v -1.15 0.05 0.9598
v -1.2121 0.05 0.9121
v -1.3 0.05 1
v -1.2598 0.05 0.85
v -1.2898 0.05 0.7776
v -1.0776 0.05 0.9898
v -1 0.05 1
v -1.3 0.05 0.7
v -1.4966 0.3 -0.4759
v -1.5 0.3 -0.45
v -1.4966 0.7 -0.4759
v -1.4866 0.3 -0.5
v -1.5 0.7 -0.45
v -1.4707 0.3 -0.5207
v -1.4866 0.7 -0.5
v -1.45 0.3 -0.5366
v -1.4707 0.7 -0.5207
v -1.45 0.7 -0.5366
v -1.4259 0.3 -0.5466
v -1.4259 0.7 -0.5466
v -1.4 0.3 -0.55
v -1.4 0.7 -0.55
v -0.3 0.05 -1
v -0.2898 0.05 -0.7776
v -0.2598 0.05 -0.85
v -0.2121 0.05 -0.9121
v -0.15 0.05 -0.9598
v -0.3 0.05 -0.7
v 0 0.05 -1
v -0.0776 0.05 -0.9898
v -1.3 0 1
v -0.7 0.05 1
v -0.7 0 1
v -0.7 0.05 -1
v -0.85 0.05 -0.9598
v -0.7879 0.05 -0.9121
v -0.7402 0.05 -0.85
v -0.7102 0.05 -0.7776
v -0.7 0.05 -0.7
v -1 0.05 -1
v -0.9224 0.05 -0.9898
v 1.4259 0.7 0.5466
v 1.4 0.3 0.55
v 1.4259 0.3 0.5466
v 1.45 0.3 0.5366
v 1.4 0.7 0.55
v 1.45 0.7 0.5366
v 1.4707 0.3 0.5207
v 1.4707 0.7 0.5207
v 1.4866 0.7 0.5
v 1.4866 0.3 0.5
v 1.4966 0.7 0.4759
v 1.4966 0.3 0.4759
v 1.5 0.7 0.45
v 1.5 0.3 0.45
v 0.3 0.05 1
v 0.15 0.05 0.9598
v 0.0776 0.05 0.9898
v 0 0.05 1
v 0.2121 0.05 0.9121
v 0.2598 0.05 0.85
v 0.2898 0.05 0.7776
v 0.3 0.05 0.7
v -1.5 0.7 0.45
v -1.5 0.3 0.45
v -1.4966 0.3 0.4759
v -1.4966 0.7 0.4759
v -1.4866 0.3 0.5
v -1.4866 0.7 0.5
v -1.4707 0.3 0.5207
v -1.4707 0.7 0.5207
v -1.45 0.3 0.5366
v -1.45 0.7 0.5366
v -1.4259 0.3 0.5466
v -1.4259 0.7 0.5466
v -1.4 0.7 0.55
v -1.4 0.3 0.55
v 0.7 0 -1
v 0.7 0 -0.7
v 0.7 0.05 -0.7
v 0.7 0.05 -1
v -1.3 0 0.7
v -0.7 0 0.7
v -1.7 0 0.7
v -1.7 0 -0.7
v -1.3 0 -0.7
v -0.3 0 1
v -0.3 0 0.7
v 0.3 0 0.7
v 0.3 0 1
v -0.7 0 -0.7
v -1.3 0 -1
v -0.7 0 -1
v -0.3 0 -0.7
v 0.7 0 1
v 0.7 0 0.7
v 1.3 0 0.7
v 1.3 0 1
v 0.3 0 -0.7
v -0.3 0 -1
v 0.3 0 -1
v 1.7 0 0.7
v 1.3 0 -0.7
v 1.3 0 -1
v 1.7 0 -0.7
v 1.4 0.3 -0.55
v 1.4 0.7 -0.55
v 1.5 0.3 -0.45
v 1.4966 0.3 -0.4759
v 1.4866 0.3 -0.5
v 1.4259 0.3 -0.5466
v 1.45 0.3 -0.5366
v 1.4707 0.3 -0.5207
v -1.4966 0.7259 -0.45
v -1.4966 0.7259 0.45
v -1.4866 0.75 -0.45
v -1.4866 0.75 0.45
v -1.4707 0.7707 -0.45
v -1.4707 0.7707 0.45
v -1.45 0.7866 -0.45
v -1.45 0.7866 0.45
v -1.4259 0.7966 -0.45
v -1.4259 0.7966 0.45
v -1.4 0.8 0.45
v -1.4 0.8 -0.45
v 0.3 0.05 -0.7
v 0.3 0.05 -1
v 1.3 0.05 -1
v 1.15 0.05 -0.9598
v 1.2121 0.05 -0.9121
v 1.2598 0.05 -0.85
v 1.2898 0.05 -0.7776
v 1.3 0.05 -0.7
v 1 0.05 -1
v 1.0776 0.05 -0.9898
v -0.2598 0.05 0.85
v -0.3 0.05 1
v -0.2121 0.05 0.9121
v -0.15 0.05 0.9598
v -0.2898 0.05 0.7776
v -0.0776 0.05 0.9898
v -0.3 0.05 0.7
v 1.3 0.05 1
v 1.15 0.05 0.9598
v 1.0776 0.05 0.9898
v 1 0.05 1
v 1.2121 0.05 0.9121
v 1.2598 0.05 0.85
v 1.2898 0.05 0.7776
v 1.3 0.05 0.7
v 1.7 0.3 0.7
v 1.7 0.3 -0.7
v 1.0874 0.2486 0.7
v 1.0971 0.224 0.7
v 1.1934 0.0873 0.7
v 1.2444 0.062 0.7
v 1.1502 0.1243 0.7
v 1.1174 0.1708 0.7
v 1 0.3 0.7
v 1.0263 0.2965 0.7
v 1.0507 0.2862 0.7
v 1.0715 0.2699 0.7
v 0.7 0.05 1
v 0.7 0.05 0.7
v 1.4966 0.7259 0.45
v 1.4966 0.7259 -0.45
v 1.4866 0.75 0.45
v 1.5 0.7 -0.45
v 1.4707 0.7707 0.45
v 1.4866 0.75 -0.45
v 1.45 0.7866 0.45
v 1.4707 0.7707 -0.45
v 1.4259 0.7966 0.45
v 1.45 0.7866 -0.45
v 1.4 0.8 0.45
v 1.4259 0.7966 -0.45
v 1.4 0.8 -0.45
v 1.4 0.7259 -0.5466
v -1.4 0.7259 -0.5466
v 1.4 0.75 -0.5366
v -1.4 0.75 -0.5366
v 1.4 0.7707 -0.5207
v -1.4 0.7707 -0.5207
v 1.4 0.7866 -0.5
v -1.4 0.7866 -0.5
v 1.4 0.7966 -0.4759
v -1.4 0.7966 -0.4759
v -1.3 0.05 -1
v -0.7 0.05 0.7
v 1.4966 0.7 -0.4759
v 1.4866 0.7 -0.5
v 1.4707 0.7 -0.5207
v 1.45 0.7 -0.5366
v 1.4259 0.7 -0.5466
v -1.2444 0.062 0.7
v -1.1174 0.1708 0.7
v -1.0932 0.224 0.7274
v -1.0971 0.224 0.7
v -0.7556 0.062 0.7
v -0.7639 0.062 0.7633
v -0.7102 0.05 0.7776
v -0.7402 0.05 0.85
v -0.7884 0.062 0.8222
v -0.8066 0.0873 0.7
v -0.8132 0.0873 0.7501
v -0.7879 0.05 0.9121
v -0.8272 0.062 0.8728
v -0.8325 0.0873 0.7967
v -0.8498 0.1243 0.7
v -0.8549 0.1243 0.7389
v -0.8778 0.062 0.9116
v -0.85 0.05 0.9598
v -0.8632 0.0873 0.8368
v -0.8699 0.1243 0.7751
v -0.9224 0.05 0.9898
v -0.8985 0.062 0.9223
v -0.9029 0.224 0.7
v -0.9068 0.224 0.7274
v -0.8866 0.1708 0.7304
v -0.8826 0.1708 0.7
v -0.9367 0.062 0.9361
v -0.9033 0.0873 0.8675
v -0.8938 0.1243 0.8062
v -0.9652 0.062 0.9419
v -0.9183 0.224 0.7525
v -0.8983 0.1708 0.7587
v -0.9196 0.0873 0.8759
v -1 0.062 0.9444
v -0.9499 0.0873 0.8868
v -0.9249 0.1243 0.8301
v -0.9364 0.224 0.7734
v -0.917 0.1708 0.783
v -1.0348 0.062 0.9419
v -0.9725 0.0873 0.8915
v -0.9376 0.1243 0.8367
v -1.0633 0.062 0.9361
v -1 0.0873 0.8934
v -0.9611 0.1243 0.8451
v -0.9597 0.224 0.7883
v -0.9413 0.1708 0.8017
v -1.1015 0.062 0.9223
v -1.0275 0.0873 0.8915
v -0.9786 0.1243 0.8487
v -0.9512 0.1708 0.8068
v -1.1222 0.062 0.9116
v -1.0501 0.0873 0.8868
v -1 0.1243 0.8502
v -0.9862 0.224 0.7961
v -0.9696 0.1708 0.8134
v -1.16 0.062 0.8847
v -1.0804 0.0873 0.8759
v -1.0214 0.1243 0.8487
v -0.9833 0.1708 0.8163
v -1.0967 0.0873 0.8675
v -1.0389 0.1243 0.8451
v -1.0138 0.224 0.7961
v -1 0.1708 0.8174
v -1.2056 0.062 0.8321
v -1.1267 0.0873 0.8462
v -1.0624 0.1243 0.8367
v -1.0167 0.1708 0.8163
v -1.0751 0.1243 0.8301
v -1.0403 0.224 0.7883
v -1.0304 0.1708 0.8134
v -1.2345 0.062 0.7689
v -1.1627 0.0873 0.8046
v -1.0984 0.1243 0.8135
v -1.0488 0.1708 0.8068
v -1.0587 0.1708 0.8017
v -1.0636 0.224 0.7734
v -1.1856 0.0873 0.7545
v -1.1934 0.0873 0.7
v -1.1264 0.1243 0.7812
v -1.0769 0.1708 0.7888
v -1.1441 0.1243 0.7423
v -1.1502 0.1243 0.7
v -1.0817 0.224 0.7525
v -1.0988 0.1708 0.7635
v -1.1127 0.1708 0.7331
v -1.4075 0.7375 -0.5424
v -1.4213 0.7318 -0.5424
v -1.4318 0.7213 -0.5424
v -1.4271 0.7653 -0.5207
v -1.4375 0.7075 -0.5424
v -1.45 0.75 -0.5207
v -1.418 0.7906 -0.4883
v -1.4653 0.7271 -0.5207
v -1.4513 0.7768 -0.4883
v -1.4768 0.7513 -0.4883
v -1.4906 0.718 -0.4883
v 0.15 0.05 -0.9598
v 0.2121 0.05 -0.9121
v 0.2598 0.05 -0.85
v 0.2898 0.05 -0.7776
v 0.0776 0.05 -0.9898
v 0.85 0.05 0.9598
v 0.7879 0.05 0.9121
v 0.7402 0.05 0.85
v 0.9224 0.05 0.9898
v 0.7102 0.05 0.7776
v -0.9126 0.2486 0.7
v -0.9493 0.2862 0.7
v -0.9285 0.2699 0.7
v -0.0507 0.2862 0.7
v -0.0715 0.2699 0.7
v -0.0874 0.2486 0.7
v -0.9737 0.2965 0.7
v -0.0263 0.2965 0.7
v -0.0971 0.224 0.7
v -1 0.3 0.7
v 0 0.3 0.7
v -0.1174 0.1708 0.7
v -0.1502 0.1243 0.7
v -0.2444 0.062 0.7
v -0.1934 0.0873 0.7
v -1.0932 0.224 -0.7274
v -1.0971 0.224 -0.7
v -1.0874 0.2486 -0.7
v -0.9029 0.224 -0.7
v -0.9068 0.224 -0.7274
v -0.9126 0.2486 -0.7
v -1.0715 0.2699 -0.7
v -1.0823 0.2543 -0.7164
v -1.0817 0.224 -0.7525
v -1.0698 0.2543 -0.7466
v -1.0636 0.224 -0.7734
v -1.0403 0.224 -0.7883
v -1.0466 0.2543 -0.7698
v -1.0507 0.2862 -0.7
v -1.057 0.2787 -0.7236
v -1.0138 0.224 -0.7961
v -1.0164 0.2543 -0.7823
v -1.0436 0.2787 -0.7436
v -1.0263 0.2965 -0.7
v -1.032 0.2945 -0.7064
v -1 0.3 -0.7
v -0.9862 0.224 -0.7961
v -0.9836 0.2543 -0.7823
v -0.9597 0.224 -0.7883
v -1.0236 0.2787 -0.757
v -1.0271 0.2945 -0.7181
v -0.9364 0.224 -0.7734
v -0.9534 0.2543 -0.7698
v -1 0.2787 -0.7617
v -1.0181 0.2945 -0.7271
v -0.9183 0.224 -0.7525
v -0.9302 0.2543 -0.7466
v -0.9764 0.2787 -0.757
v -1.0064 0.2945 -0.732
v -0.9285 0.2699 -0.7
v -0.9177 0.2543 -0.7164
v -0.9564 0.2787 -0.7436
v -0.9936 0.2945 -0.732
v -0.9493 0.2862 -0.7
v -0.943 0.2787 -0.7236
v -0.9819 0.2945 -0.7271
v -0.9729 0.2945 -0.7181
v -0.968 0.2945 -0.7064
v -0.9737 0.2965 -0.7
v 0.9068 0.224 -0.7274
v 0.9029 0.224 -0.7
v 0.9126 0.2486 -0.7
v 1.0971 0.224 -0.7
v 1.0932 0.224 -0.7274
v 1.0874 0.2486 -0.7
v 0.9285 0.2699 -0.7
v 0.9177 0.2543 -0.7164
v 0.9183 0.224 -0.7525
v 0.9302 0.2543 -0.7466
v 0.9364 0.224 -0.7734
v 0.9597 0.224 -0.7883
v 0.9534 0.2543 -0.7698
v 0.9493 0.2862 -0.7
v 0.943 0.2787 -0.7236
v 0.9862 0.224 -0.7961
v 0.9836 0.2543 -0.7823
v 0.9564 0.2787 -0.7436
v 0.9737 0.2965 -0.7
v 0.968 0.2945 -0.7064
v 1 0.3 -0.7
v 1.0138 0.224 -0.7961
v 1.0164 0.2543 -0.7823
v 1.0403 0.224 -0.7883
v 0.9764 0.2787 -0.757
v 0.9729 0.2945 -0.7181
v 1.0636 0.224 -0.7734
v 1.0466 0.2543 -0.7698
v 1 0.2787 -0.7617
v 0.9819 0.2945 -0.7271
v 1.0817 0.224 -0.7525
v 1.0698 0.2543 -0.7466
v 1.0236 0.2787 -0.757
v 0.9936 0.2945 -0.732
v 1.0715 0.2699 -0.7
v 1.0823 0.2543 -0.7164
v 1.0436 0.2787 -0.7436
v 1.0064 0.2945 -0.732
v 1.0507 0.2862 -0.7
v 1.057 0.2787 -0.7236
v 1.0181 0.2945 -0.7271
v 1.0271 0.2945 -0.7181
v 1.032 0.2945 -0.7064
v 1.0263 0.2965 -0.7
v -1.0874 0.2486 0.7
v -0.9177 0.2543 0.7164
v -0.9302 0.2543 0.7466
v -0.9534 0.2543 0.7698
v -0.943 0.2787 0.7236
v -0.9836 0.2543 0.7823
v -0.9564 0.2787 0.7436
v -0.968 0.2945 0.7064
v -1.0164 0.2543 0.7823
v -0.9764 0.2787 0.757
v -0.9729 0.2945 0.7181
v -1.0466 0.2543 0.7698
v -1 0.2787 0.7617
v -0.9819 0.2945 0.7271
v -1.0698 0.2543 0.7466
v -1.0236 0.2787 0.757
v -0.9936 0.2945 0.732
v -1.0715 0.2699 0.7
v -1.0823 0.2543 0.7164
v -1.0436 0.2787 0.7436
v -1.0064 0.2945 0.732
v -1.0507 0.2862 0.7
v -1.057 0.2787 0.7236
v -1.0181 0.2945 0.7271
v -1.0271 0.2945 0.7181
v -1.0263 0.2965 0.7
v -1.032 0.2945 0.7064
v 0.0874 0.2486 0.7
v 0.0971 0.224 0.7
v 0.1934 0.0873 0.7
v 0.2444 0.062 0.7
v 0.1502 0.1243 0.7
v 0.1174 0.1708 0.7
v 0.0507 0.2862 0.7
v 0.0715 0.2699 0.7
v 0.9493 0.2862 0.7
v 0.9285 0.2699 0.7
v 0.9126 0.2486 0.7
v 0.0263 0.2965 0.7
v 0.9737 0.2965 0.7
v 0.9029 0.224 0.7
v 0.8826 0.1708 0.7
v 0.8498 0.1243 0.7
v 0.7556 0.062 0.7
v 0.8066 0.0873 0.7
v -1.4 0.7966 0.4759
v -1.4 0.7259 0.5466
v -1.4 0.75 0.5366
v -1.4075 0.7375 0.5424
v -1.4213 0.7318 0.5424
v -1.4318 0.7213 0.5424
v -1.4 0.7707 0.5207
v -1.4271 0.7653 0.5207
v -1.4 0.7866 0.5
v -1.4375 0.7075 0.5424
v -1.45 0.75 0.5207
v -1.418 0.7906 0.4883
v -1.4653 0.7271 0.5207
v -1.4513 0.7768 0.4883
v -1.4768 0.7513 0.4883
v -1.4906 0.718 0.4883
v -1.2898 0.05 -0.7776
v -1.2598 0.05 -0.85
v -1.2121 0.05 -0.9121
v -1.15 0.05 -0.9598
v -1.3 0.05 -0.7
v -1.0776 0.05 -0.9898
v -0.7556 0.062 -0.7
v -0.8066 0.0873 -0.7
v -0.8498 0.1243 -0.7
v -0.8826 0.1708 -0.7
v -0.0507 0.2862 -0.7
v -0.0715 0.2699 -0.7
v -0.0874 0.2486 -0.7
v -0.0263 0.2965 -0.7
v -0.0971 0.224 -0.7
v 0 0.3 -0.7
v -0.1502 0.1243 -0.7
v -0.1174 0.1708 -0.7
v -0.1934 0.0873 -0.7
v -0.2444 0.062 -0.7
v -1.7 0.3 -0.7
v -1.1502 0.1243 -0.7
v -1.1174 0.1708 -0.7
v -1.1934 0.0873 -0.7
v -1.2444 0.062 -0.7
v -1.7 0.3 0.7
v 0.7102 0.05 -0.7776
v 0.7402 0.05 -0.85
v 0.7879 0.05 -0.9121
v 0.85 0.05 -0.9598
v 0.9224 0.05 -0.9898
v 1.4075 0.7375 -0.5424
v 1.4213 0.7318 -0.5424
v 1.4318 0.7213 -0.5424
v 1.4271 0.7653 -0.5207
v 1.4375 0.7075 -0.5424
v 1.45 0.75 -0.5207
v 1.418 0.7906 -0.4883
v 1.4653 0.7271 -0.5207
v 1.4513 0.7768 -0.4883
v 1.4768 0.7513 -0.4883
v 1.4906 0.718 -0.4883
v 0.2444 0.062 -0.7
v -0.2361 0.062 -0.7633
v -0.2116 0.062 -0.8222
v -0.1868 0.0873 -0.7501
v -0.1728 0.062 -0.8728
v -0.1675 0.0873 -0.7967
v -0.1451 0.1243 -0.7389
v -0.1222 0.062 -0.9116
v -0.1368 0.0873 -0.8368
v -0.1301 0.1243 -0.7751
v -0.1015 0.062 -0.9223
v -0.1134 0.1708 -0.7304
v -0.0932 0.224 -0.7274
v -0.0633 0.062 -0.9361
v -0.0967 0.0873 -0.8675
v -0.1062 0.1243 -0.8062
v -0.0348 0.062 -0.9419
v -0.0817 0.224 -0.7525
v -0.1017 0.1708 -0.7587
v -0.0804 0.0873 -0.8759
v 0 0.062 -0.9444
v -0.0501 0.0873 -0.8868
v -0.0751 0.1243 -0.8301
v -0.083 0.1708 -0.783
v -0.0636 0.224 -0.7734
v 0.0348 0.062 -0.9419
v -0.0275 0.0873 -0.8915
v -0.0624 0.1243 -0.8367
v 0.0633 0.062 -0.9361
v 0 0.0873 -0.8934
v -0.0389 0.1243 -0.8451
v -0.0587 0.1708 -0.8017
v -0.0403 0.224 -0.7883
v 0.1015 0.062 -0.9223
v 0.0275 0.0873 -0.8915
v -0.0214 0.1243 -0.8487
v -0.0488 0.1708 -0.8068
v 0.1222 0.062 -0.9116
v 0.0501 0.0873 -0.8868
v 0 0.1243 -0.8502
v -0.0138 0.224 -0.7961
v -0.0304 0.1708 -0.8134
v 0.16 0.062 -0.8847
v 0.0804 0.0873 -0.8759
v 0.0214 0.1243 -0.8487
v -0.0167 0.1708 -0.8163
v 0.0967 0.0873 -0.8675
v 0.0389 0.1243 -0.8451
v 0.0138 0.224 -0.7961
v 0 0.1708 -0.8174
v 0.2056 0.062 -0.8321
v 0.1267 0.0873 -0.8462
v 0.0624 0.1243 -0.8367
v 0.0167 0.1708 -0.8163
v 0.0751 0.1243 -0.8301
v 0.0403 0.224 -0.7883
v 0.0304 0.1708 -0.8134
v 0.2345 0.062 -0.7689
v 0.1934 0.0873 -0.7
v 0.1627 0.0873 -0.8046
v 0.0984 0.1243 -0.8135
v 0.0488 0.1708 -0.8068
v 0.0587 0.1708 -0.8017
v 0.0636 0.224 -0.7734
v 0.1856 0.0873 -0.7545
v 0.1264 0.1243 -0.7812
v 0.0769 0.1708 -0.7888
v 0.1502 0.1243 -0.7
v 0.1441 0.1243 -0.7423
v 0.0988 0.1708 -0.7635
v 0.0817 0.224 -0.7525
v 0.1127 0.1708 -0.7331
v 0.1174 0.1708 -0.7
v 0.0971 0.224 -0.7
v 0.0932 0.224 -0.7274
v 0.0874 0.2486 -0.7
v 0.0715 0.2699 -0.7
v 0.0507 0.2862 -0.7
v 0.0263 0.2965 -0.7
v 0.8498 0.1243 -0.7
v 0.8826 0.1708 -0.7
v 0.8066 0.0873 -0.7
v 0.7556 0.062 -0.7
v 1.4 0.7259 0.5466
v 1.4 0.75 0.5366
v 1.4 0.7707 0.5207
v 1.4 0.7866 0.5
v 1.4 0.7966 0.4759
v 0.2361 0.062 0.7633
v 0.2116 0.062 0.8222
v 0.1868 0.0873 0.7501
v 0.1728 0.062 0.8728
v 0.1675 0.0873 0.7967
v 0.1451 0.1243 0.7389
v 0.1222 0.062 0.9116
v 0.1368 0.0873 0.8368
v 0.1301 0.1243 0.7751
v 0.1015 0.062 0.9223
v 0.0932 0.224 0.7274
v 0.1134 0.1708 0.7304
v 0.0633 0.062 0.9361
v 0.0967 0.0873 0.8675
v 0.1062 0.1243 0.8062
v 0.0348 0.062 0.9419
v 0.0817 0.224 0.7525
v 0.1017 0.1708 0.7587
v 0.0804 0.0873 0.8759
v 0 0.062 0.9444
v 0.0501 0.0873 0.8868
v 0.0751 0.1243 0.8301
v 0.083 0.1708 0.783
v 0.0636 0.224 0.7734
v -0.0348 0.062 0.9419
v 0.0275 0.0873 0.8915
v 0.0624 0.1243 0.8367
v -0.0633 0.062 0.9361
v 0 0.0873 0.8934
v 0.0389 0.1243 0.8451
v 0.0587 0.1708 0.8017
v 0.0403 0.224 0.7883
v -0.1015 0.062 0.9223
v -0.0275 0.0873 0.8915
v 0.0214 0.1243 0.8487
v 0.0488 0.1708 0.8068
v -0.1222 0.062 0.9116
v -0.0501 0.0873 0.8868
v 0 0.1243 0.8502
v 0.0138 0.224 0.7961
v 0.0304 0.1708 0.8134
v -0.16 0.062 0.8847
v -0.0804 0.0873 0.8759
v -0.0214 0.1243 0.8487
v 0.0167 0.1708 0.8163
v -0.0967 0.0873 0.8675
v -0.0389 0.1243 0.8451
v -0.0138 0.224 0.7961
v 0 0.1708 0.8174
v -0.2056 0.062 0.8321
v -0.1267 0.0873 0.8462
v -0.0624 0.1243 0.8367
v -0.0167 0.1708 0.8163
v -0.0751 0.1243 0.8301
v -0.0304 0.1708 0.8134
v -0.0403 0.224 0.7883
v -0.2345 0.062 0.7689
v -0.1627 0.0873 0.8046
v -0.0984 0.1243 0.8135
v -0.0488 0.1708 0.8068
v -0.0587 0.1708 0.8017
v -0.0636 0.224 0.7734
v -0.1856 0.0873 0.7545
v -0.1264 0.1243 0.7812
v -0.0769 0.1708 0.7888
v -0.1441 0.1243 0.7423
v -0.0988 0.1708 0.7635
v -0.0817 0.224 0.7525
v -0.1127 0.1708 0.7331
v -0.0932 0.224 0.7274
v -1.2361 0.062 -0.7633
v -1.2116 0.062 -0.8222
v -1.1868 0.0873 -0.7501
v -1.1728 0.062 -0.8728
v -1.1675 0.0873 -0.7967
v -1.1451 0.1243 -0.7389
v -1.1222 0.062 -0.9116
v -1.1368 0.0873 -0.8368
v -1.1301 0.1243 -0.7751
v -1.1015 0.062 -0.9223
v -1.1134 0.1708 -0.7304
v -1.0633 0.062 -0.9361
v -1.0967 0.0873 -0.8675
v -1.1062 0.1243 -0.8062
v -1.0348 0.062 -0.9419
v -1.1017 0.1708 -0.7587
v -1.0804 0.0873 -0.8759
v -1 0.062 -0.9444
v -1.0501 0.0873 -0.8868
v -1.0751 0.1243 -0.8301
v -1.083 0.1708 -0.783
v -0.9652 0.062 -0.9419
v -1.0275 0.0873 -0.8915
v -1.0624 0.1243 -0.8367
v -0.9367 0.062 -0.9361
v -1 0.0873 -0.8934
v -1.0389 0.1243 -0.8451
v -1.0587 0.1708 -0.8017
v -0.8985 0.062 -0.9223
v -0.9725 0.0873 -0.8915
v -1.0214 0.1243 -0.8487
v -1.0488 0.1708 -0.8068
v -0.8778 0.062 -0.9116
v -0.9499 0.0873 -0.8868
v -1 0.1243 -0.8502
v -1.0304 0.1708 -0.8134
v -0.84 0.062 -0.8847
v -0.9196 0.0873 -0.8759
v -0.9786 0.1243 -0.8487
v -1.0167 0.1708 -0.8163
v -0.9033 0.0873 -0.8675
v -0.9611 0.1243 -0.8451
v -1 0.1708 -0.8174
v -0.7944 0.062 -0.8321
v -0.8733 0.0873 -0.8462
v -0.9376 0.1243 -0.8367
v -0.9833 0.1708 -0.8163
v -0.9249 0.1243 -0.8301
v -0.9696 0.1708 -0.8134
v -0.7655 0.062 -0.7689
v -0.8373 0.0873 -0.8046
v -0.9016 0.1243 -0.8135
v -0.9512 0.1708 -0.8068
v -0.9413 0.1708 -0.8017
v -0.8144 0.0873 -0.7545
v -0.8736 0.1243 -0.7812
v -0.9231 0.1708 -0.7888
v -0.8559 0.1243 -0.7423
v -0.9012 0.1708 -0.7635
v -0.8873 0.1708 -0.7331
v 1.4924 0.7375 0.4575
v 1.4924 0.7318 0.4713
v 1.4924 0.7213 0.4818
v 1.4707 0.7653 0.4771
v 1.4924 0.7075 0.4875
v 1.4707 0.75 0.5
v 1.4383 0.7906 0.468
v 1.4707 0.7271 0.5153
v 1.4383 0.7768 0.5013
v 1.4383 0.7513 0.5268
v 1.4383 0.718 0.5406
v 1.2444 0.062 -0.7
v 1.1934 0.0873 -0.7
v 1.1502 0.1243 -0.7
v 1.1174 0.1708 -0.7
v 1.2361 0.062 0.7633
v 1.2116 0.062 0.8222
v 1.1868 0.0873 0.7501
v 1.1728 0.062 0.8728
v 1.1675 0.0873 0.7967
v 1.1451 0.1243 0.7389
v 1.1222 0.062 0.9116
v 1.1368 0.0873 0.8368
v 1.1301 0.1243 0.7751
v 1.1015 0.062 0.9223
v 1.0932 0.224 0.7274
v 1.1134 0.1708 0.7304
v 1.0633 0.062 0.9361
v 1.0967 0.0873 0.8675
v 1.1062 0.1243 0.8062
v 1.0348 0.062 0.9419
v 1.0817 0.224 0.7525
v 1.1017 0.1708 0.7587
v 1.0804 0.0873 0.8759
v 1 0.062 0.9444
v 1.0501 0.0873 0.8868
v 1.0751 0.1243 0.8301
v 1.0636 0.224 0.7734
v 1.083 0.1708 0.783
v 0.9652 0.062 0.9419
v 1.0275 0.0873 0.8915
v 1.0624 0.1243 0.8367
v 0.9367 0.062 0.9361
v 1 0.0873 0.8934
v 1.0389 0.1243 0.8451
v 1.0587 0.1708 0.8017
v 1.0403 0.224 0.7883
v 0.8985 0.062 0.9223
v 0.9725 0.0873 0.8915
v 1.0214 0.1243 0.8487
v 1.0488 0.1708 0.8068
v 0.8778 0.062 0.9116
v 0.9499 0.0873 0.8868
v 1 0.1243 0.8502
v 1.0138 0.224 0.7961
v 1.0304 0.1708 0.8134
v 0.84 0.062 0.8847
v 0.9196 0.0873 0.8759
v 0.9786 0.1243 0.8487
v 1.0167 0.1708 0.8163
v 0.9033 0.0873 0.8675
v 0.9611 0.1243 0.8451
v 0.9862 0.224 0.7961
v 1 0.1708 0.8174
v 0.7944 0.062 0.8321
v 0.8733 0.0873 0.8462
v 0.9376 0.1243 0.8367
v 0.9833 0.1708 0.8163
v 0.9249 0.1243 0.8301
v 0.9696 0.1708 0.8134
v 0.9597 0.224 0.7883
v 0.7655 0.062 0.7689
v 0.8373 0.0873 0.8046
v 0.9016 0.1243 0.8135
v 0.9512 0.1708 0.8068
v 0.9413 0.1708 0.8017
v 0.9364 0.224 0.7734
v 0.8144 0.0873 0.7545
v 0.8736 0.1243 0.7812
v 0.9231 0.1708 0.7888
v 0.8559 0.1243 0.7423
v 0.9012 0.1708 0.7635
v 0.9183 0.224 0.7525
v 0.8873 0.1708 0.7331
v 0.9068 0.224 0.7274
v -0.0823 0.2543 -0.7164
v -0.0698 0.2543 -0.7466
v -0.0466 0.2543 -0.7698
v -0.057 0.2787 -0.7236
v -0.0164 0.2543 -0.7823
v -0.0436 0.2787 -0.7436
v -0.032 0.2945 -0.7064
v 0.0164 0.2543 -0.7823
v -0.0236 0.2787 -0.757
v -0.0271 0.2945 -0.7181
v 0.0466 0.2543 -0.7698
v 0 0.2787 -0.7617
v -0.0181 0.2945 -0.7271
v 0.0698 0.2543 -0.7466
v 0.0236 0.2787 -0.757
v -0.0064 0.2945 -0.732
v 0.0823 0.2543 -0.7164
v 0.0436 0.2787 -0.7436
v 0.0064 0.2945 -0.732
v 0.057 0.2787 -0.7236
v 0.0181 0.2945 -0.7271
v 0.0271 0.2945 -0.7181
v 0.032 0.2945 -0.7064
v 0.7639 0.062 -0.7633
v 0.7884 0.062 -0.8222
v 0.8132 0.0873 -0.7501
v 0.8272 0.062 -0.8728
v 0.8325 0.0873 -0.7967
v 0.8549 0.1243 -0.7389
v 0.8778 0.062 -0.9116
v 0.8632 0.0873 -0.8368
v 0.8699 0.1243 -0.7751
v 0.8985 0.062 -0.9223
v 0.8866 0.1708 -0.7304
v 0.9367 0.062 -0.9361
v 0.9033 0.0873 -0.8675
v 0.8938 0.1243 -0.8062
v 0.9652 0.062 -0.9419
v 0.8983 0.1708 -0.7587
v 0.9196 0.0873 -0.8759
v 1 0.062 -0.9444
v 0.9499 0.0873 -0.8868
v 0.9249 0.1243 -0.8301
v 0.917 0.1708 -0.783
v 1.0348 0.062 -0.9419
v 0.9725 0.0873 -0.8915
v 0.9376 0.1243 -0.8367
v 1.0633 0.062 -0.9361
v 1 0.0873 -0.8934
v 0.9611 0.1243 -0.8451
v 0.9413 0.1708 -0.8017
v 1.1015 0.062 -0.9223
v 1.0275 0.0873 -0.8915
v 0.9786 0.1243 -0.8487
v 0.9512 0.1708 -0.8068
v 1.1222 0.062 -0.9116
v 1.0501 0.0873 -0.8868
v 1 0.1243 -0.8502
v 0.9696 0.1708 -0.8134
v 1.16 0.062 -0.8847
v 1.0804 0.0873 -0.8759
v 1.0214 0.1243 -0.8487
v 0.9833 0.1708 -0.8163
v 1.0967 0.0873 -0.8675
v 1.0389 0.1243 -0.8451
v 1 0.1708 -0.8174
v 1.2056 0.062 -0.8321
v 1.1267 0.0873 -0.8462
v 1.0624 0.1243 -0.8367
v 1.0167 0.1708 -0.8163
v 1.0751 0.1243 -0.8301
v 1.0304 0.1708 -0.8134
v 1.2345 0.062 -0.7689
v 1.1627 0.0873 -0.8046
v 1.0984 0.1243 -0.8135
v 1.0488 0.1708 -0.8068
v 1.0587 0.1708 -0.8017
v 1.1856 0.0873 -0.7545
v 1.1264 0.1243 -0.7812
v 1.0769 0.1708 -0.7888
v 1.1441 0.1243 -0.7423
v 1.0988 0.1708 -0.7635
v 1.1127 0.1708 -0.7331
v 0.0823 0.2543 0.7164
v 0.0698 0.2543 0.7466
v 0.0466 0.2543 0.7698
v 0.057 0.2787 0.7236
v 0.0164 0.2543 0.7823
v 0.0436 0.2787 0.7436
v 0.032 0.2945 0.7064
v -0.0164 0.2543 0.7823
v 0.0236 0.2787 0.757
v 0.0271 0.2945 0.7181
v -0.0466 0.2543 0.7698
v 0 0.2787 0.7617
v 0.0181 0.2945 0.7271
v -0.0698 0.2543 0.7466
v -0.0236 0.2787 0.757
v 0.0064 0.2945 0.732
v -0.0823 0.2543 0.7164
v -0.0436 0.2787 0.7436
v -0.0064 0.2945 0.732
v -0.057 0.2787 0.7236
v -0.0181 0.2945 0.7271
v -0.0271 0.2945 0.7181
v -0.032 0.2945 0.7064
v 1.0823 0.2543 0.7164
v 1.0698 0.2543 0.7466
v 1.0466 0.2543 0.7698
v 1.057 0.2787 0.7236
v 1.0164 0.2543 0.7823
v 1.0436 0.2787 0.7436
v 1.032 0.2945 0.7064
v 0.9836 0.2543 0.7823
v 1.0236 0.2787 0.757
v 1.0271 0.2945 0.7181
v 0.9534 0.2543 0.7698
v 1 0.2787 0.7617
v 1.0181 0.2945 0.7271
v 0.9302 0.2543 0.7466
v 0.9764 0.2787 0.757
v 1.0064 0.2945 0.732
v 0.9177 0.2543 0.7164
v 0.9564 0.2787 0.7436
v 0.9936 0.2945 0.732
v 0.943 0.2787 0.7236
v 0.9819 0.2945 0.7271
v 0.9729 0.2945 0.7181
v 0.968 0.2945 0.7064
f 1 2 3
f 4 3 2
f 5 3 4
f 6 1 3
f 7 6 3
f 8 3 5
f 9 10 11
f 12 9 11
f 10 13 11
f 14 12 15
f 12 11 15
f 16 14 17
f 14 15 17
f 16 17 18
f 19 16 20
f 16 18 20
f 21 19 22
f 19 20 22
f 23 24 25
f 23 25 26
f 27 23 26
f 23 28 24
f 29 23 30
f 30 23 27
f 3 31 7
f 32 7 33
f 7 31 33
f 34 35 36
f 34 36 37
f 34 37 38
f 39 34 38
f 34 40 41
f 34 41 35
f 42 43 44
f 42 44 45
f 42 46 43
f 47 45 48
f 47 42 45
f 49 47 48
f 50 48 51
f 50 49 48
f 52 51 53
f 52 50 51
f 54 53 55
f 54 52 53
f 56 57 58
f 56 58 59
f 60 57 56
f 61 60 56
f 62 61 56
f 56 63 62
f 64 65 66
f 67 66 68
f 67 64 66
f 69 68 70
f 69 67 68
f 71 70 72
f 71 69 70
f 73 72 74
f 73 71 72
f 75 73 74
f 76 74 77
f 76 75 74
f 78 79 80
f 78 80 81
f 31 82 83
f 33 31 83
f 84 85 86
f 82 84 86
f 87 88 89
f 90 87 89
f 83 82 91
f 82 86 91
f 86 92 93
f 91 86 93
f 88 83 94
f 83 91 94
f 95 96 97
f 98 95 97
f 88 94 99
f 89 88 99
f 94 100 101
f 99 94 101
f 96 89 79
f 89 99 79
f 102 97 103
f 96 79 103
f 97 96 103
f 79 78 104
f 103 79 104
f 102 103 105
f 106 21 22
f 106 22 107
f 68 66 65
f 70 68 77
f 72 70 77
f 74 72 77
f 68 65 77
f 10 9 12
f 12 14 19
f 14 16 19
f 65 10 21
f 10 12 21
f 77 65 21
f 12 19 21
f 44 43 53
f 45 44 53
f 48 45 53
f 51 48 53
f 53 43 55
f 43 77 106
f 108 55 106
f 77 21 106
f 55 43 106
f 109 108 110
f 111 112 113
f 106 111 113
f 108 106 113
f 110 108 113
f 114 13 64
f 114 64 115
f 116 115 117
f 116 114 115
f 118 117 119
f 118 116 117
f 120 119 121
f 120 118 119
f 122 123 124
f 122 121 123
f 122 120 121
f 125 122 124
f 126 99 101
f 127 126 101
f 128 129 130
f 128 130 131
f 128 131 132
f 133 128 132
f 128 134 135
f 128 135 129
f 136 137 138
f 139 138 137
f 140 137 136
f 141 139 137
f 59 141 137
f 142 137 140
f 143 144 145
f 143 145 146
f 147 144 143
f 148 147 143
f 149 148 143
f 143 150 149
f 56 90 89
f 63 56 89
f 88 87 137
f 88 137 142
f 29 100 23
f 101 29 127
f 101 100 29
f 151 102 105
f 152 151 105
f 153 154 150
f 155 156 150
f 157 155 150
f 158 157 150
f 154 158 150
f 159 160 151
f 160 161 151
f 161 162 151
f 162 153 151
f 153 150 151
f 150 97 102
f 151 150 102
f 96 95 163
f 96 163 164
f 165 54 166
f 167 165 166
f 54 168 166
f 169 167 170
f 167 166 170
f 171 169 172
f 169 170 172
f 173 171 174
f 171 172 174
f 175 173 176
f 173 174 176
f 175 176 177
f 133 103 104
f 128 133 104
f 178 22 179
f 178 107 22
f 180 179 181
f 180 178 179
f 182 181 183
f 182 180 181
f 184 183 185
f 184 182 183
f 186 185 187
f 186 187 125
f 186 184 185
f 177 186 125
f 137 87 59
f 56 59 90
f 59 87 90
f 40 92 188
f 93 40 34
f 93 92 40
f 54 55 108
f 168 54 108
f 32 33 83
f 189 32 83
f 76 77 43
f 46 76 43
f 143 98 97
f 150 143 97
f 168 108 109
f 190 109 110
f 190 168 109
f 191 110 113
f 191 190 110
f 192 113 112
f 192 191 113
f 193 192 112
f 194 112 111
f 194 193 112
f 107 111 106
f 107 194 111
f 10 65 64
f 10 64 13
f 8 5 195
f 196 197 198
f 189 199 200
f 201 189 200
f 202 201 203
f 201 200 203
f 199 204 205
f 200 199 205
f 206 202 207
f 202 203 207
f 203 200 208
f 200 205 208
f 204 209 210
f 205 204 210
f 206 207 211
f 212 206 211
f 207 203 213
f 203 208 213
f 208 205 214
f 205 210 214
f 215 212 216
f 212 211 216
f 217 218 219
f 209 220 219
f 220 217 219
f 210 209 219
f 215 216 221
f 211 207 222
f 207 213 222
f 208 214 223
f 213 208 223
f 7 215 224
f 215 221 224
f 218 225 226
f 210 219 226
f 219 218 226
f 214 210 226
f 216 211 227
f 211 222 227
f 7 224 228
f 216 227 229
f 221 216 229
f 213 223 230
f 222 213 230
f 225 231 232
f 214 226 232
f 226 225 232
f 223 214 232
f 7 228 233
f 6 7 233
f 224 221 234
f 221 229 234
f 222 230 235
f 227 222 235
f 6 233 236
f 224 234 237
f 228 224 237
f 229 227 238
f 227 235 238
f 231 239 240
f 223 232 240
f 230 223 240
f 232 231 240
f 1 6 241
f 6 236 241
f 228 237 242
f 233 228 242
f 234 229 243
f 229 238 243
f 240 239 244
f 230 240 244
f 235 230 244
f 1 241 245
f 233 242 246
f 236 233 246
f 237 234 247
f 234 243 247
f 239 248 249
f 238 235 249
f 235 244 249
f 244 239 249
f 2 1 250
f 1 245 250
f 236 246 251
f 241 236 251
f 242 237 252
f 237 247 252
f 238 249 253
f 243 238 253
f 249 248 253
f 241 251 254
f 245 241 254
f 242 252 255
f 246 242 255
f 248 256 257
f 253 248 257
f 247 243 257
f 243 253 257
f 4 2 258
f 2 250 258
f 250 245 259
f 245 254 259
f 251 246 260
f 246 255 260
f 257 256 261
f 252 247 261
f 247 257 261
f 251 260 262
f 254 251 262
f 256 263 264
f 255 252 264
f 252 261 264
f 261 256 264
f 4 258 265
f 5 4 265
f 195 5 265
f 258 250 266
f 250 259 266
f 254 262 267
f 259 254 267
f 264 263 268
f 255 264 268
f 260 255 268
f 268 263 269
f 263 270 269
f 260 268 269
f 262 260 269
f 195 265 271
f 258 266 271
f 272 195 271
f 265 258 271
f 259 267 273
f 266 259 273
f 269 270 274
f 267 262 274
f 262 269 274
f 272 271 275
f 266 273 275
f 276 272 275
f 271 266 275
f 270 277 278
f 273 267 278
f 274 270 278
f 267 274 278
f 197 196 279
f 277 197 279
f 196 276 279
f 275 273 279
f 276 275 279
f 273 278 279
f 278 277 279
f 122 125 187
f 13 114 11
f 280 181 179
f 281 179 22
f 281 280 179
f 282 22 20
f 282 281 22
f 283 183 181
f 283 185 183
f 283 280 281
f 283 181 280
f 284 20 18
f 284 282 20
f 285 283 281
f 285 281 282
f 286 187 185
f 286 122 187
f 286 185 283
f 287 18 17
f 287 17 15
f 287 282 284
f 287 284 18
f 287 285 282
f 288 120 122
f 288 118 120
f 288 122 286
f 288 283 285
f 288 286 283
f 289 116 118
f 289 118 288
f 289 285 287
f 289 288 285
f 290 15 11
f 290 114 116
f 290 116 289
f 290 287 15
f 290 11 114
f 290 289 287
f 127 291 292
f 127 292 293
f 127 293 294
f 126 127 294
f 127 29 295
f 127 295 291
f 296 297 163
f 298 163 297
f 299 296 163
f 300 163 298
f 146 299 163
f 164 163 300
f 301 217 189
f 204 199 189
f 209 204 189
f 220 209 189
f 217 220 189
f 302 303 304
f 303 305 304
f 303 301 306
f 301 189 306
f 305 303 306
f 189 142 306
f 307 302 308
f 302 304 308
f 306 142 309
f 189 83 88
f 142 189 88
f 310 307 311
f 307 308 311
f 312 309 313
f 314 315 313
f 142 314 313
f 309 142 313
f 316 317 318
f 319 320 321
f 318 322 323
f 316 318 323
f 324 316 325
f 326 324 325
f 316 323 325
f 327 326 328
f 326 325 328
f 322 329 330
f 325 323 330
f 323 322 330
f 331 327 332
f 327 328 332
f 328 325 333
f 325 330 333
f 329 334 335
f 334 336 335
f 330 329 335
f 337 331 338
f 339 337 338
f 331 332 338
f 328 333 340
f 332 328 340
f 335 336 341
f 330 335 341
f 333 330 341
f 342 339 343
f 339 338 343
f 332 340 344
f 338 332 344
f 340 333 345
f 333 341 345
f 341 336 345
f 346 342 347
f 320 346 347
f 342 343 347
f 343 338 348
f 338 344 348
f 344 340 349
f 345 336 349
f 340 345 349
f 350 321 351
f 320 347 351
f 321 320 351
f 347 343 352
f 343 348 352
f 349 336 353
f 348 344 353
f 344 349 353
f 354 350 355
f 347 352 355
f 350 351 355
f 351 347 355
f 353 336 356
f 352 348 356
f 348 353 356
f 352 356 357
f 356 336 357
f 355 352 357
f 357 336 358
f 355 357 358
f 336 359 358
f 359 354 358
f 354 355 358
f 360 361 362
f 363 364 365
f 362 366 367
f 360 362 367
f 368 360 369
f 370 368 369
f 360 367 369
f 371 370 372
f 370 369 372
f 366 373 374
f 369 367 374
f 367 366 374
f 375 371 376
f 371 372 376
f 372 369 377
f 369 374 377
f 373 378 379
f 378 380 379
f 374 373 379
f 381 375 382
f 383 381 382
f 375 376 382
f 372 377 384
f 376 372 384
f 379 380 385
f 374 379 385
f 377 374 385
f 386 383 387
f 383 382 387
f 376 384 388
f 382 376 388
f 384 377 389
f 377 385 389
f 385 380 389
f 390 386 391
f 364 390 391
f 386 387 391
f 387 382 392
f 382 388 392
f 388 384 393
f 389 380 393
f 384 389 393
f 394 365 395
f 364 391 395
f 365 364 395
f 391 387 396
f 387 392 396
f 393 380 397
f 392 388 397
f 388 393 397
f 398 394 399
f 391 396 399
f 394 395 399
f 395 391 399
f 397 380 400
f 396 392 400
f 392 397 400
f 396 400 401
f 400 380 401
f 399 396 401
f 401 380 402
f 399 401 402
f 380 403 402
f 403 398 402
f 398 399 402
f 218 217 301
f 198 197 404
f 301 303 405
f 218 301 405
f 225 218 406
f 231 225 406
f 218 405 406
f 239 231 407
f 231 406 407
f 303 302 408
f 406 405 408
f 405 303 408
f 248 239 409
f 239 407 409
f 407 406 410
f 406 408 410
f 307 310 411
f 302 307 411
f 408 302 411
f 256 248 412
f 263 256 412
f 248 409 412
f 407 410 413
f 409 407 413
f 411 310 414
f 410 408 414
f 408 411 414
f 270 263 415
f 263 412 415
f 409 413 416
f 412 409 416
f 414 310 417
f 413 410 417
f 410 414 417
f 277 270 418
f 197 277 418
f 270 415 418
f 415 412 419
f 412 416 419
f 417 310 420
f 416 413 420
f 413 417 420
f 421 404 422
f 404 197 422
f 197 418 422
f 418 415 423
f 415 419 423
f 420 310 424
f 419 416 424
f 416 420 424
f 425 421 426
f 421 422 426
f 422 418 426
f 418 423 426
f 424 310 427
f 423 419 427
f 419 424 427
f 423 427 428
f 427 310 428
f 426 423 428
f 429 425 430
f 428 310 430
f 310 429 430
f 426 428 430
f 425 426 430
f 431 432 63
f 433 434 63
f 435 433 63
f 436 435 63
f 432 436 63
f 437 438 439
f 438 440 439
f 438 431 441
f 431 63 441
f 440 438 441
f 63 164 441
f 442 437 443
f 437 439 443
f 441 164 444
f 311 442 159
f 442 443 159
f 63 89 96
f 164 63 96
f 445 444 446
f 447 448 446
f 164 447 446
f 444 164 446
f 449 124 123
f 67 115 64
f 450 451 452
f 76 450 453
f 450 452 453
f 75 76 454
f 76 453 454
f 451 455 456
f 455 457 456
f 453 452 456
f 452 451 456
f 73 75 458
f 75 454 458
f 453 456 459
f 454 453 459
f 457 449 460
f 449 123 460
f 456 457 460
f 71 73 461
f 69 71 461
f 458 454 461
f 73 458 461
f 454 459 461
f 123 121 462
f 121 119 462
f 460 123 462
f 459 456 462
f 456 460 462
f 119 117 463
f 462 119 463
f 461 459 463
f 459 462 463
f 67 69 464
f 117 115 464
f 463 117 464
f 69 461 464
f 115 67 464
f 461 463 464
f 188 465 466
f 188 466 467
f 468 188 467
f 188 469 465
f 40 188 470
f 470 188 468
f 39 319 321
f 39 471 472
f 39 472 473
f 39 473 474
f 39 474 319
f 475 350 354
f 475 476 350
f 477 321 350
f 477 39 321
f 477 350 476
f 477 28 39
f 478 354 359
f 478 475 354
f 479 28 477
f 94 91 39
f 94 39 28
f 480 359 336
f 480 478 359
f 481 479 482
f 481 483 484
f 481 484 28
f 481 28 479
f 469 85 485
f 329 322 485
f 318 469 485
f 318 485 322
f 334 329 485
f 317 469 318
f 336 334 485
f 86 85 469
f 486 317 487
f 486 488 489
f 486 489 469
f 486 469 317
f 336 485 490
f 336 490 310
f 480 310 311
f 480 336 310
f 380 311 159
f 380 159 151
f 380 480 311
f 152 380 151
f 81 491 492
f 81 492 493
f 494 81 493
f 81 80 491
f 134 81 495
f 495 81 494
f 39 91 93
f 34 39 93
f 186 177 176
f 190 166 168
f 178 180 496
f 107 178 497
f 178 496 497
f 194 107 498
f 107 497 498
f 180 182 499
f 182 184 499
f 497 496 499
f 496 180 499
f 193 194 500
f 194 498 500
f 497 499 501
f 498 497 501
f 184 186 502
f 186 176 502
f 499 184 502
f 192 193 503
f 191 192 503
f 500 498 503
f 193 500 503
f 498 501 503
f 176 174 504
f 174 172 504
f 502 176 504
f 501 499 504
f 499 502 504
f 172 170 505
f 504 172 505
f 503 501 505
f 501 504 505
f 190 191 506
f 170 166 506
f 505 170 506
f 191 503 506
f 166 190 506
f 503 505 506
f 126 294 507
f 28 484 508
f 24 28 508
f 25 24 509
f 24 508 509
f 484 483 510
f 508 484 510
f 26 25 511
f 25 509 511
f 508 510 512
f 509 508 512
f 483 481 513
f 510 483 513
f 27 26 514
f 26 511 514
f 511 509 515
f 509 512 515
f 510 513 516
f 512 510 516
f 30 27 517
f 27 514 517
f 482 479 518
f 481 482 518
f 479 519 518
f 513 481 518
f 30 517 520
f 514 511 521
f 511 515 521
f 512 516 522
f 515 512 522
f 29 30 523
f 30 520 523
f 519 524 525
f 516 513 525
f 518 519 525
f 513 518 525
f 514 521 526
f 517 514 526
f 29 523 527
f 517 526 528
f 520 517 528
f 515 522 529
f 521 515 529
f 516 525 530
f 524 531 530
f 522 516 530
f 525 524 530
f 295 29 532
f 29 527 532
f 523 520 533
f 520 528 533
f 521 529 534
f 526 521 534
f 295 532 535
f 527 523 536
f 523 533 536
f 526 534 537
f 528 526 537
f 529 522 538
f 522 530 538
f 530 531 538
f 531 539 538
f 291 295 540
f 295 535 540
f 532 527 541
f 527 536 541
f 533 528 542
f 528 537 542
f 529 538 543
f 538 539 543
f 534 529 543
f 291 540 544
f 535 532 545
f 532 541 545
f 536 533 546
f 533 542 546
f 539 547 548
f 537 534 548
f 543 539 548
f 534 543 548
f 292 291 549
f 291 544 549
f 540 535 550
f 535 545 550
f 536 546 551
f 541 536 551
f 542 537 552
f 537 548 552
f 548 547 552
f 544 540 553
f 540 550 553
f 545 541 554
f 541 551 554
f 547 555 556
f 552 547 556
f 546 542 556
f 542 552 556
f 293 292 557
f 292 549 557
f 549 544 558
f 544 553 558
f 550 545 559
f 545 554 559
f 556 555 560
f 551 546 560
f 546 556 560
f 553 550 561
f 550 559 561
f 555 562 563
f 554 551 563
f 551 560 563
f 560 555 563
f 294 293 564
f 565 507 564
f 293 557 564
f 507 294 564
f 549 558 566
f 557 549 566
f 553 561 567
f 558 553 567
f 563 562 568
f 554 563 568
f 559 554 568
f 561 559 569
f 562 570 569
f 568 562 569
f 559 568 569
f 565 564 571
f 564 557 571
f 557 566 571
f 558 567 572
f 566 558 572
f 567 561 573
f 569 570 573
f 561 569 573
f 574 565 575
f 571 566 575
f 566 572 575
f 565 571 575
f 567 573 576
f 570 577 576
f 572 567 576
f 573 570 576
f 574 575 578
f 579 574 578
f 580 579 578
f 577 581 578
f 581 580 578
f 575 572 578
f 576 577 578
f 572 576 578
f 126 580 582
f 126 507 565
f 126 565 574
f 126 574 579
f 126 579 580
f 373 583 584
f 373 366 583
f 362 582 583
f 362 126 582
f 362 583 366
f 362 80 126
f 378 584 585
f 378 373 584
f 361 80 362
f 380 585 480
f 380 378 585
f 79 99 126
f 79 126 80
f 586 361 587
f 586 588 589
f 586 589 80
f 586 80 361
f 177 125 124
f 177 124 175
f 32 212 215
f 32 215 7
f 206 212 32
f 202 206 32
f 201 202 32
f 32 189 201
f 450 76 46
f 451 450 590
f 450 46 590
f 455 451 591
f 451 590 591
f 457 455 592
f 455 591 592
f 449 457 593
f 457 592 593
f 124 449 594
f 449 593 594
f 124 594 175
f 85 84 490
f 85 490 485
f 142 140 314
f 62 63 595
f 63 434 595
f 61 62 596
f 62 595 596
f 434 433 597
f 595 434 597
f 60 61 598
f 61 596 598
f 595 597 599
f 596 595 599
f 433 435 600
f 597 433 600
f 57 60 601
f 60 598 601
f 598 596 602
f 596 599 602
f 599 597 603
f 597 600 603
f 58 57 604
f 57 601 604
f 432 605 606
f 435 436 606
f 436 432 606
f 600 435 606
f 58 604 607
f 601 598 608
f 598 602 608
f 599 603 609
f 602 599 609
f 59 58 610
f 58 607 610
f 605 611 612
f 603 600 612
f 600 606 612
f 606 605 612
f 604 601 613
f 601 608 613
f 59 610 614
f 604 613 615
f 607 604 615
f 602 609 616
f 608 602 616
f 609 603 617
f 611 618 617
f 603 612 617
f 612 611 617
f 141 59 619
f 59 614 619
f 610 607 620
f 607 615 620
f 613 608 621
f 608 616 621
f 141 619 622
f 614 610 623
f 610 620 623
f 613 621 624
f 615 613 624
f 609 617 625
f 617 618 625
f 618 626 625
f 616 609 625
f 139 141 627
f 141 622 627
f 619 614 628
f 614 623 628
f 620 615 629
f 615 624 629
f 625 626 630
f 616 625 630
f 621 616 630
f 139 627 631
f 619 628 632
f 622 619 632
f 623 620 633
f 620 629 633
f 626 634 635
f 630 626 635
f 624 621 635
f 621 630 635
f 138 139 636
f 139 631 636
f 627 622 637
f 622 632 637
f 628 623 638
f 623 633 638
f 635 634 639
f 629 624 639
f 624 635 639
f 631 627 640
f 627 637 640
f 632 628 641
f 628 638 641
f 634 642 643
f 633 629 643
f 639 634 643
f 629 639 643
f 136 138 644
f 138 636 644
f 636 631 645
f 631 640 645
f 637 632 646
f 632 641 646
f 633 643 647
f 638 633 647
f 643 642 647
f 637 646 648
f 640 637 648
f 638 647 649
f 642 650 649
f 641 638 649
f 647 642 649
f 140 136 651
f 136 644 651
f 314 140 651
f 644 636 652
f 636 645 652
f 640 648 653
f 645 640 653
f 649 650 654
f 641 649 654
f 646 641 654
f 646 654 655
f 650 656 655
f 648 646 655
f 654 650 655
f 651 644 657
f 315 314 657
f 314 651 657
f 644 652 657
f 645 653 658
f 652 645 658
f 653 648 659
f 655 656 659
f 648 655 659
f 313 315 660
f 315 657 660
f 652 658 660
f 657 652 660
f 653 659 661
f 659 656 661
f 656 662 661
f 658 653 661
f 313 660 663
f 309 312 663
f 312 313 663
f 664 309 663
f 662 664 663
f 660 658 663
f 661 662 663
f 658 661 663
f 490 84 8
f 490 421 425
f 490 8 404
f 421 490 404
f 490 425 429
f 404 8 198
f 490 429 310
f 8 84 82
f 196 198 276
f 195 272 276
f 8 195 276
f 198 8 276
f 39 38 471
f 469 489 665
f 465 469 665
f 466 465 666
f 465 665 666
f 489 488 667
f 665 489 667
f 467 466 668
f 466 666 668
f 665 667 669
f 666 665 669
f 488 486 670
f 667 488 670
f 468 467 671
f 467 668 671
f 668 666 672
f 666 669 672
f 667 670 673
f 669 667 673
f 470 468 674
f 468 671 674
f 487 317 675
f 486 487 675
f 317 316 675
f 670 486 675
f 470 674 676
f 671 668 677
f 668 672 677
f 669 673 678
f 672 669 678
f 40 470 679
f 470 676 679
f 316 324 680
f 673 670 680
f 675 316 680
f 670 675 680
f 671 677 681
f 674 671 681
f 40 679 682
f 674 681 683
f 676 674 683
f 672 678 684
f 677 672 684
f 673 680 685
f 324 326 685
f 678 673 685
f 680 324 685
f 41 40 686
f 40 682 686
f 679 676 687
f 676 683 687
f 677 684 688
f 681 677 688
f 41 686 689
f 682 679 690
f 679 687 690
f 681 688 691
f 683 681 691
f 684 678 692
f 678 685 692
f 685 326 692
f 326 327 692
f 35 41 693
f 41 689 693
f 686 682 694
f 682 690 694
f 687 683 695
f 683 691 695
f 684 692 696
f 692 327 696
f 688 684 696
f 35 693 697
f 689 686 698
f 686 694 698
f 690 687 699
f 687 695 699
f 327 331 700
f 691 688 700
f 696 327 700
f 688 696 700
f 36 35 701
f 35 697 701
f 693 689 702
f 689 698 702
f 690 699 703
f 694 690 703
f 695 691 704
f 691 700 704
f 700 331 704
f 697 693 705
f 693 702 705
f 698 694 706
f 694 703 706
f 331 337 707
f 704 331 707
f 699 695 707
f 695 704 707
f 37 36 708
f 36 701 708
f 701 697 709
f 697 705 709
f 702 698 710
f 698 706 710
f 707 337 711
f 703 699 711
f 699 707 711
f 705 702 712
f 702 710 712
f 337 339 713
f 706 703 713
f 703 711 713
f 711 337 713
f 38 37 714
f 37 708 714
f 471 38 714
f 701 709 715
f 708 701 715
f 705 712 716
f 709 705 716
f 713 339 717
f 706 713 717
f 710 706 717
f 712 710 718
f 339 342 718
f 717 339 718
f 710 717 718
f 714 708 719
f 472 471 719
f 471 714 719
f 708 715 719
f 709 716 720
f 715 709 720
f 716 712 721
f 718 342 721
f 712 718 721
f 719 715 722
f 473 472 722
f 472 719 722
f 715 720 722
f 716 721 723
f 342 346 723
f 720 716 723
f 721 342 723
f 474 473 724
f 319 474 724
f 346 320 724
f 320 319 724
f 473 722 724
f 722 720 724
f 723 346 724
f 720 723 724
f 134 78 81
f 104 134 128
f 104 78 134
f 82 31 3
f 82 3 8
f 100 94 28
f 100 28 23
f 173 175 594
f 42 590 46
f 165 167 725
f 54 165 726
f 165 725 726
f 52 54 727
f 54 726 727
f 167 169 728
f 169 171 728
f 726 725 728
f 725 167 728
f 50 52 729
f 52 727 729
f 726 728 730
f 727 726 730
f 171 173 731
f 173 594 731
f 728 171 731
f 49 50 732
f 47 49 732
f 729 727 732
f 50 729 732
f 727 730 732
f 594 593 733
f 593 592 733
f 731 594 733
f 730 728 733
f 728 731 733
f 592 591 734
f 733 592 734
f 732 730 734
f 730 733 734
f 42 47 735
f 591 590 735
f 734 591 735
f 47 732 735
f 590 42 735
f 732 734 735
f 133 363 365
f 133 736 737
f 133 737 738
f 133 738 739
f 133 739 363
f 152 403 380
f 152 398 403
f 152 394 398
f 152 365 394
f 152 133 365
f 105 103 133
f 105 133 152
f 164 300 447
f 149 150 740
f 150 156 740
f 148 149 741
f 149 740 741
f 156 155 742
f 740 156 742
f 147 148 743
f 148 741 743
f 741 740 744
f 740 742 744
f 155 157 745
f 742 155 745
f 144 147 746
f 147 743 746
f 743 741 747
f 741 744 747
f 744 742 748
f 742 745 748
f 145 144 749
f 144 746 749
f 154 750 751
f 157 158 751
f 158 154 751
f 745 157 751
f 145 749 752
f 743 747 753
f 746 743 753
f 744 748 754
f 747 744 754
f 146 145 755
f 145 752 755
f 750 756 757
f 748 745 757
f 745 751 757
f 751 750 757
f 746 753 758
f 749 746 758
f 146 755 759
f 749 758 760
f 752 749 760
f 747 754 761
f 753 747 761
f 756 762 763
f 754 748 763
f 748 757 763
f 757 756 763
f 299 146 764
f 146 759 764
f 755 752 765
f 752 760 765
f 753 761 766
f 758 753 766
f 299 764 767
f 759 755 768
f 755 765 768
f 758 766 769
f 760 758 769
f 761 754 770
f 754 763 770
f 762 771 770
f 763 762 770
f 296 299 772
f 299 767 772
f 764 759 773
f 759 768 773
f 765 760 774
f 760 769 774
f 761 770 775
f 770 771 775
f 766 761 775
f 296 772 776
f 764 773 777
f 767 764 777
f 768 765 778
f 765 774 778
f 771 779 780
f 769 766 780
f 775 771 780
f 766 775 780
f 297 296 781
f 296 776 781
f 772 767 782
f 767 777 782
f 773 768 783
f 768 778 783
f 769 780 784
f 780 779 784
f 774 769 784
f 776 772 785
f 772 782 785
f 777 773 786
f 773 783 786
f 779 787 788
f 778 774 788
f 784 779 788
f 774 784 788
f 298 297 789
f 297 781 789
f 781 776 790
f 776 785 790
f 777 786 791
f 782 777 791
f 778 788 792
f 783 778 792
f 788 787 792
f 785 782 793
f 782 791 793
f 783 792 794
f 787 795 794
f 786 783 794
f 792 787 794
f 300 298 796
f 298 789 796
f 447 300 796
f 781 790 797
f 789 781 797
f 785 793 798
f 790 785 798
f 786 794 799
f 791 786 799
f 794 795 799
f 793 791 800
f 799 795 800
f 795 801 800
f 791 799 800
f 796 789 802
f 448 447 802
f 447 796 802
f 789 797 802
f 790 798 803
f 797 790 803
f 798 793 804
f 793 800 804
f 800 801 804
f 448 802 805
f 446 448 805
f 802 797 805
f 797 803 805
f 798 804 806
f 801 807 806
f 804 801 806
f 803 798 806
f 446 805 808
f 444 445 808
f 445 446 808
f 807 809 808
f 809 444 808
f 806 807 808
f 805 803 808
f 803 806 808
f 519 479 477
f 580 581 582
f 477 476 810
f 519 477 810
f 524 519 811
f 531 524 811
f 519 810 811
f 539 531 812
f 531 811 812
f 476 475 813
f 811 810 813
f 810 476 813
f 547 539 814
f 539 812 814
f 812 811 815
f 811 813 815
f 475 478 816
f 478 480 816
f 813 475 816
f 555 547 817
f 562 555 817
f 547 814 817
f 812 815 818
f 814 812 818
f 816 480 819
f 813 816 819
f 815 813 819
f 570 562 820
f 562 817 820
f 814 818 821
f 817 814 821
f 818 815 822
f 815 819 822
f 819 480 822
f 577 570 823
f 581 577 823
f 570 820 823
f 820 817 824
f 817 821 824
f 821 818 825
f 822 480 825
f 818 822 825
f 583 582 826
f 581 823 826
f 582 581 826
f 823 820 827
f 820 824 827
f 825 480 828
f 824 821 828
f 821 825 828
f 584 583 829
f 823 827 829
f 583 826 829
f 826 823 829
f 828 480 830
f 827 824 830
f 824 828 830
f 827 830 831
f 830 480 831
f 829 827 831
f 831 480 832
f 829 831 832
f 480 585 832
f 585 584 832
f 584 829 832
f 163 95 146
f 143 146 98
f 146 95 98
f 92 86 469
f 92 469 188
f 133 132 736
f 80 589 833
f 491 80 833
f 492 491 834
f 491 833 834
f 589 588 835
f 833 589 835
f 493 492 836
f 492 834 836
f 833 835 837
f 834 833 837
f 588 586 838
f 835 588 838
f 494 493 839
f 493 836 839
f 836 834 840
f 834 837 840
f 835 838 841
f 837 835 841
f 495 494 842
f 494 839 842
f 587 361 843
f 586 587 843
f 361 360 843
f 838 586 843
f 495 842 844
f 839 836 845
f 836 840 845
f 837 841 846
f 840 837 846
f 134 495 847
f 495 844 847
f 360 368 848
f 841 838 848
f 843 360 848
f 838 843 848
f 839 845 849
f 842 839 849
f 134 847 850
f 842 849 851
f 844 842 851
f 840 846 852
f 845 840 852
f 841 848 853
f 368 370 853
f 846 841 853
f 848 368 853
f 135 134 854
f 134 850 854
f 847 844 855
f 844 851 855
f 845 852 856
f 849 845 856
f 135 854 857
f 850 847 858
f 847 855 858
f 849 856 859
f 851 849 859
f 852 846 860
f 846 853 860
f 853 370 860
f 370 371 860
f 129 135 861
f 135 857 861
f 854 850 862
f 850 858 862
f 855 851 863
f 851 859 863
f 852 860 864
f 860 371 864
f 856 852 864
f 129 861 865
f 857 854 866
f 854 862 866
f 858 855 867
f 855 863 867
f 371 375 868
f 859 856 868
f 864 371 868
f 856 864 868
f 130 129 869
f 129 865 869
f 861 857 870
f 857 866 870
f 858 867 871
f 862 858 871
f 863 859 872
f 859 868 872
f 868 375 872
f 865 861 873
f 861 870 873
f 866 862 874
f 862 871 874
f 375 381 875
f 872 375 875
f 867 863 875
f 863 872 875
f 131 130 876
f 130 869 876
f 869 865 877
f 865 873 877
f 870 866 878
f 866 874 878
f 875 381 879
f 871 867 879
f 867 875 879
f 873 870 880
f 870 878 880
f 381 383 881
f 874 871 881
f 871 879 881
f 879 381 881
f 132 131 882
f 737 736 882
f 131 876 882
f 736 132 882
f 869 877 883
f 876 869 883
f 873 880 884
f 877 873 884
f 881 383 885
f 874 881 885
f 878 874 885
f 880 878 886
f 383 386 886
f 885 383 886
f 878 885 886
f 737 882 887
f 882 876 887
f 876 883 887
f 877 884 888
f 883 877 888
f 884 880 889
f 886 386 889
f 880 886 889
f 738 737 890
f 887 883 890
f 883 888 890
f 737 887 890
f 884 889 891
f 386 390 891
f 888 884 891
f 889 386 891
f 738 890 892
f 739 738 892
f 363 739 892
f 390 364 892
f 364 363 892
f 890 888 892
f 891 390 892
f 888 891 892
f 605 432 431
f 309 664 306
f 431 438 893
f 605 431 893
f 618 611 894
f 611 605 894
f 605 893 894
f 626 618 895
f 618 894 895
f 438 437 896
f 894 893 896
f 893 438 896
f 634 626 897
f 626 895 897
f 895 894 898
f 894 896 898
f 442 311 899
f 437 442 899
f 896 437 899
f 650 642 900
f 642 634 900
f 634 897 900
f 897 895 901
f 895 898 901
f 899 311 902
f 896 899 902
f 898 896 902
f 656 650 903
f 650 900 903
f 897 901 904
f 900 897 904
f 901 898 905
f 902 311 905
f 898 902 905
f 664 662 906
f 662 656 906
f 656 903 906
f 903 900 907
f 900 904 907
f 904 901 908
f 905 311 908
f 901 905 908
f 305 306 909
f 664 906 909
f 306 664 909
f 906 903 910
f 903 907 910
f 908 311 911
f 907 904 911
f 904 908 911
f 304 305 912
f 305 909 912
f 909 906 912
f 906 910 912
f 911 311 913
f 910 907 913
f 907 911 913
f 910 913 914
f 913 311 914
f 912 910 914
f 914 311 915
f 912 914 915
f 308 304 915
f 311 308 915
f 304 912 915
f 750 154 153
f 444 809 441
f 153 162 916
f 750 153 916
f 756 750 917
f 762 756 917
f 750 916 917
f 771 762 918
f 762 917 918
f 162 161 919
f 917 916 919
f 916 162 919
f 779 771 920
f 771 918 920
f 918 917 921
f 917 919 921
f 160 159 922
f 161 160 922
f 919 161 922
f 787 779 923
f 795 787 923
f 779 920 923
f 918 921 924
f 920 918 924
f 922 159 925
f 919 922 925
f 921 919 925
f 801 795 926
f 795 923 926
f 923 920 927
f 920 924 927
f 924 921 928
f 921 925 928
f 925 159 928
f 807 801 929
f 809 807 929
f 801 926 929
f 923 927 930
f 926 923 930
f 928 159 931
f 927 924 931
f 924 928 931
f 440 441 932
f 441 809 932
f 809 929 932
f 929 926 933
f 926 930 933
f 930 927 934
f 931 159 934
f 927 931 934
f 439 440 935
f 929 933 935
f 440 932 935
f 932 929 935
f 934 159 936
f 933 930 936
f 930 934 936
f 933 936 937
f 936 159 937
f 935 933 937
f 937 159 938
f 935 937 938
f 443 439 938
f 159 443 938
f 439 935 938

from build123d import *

# Parameters (mm, degrees)
SKETCH1_W            = 3.4
SKETCH1_H            = 1.4
BOSS_EXTRUDE1_DEPTH  = 0.3
SKETCH2_W            = 3
SKETCH2_H            = 1.1
BOSS_EXTRUDE2_DEPTH  = 0.5
FILLET1_R            = 0.1
SKETCH3_W            = 0.6
SKETCH3_H            = 2
BOSS_EXTRUDE3_DEPTH  = 0.05
LPATTERN2_COUNT      = 3
LPATTERN2_PITCH      = 1
LPATTERN2_COUNT_DIR2 = 2
LPATTERN2_PITCH_DIR2 = 1.4


with BuildPart() as part:
    # Sketch1 → Boss-Extrude1 (new body)
    with BuildSketch(Plane(origin=(0, 0, 0), x_dir=(1, 0, 0), z_dir=(0, 1, 0))):
        Rectangle(SKETCH1_W, SKETCH1_H)
    extrude(amount=BOSS_EXTRUDE1_DEPTH)

    # Sketch3 → Boss-Extrude3 (add)
    with BuildSketch(Plane(origin=(0, 0, 0), x_dir=(1, 0, 0), z_dir=(0, 1, 0))):
        Rectangle(SKETCH3_W, SKETCH3_H)
        with Locations((1, 0)):
            Rectangle(SKETCH3_W, SKETCH3_H)
        with Locations((-1, 0)):
            Rectangle(SKETCH3_W, SKETCH3_H)
    extrude(amount=BOSS_EXTRUDE3_DEPTH)

    # Sketch5 → Revolve1 (revolve)
    with BuildSketch(Plane.ZY.offset(-1)):
        with BuildLine():
            Line((0.7, 0.3), (0.7, 0.05))
            Line((0.7, 0.05), (1, 0.05))
            ThreePointArc((1, 0.05), (0.870678479, 0.104483723), (0.797085133, 0.223968247))
            ThreePointArc((0.797085133, 0.223968247), (0.761657016, 0.278729996), (0.7, 0.3))
        make_face()
    revolve1 = revolve(axis=Axis((1, 0.521321821, 0.7), (0, -1, 0)))

    # LPattern2: Revolve1 3 × 2
    with Locations(*[(-i * LPATTERN2_PITCH, 0, -j * LPATTERN2_PITCH_DIR2) for i in range(LPATTERN2_COUNT) for j in range(LPATTERN2_COUNT_DIR2) if (i, j) != (0, 0)]):
        add(revolve1)


with BuildPart() as body_2:
    # Sketch2 → Boss-Extrude2 (new body)
    with BuildSketch(Plane(origin=(0, 0.3, 0), x_dir=(1, 0, 0), z_dir=(0, 1, 0))):
        Rectangle(SKETCH2_W, SKETCH2_H)
    extrude(amount=BOSS_EXTRUDE2_DEPTH)

    # Fillet1
    fillet1_edges = [body_2.edges().sort_by_distance(p)[0] for p in [
        (-1.5, 0.8, 0),
        (0, 0.8, 0.55),
        (1.5, 0.8, 0),
        (0, 0.8, -0.55),
        (1.5, 0.55, 0.55),
        (-1.5, 0.55, 0.55),
        (-1.5, 0.55, -0.55),
        (1.5, 0.55, -0.55),
    ]]
    fillet(fillet1_edges, radius=FILLET1_R)


solid = Compound([part.part, body_2.part])
